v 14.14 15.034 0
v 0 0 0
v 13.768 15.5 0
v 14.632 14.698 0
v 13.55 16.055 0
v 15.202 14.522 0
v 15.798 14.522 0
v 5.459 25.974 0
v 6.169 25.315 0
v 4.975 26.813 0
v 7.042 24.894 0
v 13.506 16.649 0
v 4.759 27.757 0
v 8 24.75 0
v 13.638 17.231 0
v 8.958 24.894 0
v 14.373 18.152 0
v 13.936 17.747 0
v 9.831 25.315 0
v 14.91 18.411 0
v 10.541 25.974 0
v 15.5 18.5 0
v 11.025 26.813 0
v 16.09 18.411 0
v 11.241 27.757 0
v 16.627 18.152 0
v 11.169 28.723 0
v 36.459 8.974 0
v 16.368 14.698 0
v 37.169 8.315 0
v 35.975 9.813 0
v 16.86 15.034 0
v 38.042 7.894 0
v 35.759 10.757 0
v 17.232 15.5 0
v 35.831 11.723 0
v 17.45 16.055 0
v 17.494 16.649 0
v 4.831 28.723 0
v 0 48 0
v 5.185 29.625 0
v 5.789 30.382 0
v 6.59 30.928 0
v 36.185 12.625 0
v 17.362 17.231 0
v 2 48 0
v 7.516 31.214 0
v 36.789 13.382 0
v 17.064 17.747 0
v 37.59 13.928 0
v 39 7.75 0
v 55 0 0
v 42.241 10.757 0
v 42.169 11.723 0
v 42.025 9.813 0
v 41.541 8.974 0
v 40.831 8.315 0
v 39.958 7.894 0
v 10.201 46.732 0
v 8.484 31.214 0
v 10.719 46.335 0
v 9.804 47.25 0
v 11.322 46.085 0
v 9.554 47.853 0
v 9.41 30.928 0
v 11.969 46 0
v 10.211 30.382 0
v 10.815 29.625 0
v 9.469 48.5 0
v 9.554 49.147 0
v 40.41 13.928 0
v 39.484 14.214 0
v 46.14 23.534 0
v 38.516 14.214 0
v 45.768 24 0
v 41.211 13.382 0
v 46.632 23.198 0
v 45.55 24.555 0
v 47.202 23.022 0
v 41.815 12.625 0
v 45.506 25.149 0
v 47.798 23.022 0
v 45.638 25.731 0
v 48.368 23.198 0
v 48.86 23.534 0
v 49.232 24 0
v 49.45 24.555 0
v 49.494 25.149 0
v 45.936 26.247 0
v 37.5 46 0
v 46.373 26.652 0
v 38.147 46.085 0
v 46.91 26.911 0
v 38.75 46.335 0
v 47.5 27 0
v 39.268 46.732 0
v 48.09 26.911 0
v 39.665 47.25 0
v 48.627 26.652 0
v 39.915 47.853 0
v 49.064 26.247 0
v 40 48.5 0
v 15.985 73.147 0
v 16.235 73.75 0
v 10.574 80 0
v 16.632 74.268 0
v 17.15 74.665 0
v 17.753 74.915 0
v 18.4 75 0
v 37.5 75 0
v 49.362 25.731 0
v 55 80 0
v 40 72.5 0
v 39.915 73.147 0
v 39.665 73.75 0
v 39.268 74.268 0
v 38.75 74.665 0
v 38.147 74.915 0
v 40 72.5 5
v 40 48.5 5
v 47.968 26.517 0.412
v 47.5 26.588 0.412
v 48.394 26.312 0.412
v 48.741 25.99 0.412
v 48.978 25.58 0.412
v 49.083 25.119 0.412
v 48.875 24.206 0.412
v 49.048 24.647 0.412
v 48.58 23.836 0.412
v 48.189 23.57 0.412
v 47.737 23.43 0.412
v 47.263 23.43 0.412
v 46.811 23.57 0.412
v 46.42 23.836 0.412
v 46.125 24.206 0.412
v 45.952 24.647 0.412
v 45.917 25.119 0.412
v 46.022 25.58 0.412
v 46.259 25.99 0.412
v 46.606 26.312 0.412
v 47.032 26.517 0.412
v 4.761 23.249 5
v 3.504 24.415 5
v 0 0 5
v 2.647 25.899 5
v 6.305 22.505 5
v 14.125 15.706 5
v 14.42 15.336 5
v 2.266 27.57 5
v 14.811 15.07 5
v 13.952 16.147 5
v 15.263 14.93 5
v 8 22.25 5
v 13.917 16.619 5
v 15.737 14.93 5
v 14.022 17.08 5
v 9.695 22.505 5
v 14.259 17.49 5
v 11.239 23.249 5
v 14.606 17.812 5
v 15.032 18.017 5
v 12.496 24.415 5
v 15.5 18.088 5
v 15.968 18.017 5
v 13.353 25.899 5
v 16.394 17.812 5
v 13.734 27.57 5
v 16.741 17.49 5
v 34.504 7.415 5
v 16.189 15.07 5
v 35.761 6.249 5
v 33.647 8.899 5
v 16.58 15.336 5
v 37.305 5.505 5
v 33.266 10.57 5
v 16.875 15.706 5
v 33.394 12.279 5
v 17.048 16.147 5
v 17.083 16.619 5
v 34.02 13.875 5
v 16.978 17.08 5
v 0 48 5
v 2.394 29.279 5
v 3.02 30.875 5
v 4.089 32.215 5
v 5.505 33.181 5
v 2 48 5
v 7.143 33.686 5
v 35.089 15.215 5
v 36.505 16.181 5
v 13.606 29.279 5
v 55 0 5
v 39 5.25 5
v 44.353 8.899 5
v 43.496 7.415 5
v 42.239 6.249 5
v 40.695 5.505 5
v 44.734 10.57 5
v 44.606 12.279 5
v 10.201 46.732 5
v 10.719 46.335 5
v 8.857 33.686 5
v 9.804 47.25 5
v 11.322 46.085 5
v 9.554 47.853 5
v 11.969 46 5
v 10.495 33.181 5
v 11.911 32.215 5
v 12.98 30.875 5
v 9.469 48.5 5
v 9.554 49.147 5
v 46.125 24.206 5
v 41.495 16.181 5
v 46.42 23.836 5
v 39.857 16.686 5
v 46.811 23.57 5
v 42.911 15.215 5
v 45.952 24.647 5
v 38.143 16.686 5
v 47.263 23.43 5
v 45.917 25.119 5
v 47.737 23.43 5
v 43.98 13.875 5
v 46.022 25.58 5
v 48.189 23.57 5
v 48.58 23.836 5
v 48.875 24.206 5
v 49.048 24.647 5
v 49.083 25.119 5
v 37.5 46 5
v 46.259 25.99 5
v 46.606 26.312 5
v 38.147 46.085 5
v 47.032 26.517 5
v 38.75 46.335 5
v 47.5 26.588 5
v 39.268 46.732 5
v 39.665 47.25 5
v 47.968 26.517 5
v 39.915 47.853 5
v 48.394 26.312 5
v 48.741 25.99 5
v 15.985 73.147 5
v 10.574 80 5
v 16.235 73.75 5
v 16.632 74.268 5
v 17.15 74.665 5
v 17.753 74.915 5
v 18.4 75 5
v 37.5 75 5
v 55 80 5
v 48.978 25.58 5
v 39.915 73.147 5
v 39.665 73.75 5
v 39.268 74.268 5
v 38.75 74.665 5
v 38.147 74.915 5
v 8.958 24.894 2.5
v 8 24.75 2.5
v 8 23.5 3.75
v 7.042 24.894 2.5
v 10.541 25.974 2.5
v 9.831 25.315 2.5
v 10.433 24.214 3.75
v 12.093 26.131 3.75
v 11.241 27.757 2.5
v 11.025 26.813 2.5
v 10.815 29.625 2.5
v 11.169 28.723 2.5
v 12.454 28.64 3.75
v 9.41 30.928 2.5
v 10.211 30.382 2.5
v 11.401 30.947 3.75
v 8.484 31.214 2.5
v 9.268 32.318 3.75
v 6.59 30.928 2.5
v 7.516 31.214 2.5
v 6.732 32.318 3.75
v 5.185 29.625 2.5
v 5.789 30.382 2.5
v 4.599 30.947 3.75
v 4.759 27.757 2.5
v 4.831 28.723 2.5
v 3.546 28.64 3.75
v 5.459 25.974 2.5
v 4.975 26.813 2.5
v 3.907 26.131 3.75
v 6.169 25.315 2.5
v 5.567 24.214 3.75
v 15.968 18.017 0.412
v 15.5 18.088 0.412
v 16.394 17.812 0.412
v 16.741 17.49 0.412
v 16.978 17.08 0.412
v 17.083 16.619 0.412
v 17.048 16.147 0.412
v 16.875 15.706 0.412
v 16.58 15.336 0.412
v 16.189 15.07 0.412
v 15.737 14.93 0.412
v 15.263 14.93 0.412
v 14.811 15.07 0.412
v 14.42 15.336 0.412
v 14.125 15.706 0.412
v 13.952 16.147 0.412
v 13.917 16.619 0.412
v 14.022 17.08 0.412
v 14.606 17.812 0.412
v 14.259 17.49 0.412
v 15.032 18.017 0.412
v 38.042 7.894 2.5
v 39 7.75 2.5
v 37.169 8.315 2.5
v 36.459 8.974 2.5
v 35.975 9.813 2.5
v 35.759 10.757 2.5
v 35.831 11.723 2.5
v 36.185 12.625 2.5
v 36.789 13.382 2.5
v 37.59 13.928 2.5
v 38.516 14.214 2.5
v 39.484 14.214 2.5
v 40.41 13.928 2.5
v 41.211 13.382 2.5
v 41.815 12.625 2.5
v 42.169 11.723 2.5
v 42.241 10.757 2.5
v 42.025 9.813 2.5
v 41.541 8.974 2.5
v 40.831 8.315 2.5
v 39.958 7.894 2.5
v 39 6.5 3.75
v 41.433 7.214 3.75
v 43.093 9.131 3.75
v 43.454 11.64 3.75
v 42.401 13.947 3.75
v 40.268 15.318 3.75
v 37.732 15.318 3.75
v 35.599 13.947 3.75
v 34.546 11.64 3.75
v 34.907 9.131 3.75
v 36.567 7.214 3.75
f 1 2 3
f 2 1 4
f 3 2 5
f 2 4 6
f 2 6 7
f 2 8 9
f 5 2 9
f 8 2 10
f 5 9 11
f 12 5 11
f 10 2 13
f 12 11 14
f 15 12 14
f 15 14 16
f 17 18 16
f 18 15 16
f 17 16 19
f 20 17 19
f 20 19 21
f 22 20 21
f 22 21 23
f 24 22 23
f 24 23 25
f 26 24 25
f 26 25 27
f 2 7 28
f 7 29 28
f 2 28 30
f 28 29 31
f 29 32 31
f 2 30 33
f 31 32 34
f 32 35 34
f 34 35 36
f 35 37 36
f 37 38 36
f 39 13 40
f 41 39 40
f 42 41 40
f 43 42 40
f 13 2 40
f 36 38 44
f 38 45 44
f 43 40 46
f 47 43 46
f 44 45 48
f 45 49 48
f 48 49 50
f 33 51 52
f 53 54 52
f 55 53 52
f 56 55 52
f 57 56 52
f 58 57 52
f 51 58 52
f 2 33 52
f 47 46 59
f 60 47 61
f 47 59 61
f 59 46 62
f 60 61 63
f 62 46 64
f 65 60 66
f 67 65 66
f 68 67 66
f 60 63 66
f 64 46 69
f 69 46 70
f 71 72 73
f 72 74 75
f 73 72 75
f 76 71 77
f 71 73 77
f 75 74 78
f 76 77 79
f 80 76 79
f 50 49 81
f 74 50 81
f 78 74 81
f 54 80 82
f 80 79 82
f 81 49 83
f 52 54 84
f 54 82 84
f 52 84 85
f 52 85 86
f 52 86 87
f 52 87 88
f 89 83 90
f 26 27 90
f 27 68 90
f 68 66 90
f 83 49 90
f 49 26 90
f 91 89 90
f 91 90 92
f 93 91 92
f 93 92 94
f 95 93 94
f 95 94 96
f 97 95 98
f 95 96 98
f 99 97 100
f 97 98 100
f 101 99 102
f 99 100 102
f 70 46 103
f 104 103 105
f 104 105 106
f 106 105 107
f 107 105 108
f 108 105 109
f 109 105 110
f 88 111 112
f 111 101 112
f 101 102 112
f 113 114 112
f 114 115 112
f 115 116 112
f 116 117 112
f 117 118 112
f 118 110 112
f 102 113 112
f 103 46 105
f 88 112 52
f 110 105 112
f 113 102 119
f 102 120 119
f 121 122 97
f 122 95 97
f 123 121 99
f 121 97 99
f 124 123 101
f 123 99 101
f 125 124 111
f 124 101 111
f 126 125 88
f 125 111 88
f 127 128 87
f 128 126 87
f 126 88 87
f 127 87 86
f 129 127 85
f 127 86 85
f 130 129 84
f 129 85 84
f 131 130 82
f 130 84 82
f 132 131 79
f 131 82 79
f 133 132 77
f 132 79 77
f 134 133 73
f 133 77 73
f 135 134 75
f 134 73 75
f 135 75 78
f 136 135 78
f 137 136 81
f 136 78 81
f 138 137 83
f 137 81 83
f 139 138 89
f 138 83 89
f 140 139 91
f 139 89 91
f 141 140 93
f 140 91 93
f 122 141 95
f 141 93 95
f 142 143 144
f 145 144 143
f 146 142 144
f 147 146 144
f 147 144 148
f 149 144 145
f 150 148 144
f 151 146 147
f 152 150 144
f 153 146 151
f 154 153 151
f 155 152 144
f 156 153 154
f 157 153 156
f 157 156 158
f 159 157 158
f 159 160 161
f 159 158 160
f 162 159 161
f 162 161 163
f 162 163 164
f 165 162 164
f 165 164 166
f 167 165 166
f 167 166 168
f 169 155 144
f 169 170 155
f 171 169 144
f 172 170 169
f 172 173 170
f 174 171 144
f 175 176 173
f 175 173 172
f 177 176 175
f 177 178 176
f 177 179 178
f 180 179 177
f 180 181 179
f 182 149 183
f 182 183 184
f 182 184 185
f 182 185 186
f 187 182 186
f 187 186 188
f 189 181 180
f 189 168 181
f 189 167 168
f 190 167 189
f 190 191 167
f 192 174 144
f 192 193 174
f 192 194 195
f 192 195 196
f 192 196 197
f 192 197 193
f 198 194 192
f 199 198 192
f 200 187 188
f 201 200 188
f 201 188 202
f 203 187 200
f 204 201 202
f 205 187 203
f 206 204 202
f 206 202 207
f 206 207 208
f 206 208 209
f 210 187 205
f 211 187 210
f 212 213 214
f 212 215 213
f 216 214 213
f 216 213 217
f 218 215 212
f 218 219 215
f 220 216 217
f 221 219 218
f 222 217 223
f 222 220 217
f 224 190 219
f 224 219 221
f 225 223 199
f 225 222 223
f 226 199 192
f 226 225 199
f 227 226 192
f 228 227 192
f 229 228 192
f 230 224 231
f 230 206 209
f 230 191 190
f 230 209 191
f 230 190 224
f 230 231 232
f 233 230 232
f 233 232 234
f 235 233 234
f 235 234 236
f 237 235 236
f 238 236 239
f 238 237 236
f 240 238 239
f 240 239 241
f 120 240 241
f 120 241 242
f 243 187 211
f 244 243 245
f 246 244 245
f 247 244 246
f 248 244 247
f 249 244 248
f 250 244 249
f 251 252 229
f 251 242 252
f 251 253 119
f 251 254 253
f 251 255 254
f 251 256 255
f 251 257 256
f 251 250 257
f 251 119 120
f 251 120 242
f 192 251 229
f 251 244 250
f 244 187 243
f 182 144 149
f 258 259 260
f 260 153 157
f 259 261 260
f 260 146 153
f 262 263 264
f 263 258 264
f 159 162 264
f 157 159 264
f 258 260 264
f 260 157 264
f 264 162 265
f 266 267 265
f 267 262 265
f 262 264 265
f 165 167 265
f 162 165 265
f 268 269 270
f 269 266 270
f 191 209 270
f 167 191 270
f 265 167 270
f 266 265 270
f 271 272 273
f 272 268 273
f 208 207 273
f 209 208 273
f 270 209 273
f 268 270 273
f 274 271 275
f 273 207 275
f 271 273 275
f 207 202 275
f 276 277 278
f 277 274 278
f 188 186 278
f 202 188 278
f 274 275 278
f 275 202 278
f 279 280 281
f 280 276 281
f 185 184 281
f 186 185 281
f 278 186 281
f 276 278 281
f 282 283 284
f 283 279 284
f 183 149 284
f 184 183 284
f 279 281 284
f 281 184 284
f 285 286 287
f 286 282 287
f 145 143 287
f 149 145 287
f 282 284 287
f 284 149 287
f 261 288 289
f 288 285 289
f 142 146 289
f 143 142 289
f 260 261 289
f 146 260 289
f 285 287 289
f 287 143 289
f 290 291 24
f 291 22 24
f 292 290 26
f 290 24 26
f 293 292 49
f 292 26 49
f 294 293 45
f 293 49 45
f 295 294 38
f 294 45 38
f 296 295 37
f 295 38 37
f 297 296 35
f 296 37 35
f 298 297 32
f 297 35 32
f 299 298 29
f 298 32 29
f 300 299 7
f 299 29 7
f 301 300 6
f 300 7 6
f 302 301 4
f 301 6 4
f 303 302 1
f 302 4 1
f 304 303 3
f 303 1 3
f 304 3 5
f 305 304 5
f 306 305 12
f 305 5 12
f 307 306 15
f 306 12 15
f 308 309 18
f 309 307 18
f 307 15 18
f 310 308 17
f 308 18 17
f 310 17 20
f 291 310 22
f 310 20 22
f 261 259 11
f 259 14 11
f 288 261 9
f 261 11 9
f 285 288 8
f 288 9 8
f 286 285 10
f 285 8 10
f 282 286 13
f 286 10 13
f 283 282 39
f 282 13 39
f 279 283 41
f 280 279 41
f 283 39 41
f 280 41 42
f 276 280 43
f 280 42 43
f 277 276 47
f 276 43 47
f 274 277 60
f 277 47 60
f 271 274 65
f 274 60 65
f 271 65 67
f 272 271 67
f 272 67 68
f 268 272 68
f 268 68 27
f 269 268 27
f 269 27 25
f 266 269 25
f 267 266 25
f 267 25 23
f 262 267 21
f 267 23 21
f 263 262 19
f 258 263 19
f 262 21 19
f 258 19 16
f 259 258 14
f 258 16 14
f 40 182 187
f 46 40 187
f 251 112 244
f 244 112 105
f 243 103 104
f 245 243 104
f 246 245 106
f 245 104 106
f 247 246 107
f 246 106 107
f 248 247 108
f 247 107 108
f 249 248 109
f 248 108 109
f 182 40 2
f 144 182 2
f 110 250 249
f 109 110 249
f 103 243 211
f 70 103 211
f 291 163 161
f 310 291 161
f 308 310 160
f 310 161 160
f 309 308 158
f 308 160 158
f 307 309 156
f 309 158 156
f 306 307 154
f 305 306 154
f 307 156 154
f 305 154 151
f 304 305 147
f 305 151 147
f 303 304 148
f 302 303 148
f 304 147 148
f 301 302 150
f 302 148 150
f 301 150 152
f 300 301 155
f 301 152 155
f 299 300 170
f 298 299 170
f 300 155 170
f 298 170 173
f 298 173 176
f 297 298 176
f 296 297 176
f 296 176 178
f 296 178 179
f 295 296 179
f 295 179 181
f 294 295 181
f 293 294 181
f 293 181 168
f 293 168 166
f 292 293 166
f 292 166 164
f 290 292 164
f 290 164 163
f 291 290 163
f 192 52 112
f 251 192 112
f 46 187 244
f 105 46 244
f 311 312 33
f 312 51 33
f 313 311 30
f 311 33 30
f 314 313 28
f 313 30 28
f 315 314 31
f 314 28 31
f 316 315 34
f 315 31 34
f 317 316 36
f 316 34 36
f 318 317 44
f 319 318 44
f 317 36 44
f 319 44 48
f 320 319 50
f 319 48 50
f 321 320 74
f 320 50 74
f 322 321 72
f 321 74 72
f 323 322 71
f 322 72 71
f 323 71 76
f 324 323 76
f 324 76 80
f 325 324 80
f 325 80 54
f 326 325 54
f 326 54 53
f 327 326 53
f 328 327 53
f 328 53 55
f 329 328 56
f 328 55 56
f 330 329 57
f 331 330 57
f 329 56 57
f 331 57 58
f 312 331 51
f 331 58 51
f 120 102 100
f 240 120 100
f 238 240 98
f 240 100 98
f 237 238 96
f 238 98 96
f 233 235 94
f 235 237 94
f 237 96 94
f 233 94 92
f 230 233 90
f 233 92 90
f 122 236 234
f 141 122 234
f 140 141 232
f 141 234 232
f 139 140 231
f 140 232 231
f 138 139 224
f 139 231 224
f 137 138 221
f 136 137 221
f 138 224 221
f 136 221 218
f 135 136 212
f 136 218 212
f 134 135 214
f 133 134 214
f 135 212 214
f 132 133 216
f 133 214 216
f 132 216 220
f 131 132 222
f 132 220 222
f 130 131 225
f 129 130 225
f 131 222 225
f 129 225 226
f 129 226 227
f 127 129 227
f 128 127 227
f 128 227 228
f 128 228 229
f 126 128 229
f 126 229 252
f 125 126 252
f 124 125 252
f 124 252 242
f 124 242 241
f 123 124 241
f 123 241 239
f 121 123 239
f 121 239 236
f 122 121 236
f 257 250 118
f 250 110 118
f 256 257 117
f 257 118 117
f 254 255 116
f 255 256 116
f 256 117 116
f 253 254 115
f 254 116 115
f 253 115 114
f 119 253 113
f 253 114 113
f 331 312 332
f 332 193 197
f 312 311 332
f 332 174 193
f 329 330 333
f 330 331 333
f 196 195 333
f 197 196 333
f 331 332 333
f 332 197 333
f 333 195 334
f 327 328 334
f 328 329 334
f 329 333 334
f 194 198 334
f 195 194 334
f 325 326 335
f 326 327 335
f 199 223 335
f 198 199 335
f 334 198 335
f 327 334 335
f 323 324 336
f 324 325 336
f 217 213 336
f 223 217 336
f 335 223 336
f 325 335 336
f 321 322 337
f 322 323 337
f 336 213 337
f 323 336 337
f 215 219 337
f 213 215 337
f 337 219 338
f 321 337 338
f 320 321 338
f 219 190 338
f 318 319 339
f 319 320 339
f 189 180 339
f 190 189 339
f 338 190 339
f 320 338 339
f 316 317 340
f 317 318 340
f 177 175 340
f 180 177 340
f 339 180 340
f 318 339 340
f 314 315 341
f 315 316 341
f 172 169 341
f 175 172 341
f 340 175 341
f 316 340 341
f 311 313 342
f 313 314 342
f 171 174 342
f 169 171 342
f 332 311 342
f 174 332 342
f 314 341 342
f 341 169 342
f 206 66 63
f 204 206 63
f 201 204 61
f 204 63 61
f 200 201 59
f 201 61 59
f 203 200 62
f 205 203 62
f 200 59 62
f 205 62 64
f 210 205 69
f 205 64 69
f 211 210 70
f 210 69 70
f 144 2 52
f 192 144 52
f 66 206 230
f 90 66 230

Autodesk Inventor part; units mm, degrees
ref_plane "YZ Plane" through (0, 0, 0) normal (1, 0, 0) x (0, 1, 0)
ref_plane "XZ Plane" through (0, 0, 0) normal (0, 1, 0) x (-1, 0, 0)
ref_plane "XY Plane" through (0, 0, 0) normal (0, 0, 1) x (1, 0, 0)
sketch "Sketch1" plane through (0, 0, 0) normal (0, 0, 1) x (1, 0, 0)
  line L0 (0, 0) -> (55, 0)
  line L1 (55, 0) -> (55, 80)
  line L2 (55, 80) -> (0, 80)
  line L3 (0, 80) -> (0, 0)
  dimension "d0" = 55
  dimension "d1" = 80
extrude "Extrusion1" add sketch "Sketch1" along normal blind 5
sketch "Sketch6" plane through (0, 0, 5) normal (0, 0, 1) x (1, 0, 0)
  line L0 (0, 0) -> (0, 80) projected
  line L1 (55, 0) -> (0, 0) projected
  line L2 (0, 80) -> (55, 80) projected
  line L3 (0, 48) -> (2, 48)
  line L4 (2, 48) -> (10.5744, 80)
  dimension "d37" = 15
  dimension "d38" = 2
  dimension "d39" = 48
extrude "Extrusion4" cut sketch "Sketch6" against normal blind 5
sketch "Sketch7" plane through (0, 0, 5) normal (0, 0, 1) x (1, 0, 0)
  line L0 (10.5744, 80) -> (2, 48) projected
  line L1 (55, 80) -> (55, 0) projected
  line L2 (10.5744, 80) -> (55, 80) projected
  line L3 (40, 46) -> (40, 75)
  line L4 (40, 75) -> (16.4816, 75)
  line L5 (16.4816, 75) -> (8.711, 46)
  line L6 (8.711, 46) -> (40, 46)
  dimension "d42" = 29
  dimension "d43" = 5
  dimension "d44" = 15
  dimension "d45" = 7
extrude "Extrusion5" cut sketch "Sketch7" against normal blind 5
fillet "Fillet2" radius 2.5 4 edges at (16.4816, 75, 2.5) (40, 75, 2.5) (8.711, 46, 2.5) (40, 46, 2.5)
sketch "Sketch8" plane through (0, 0, 5) normal (0, 0, 1) x (1, 0, 0)
  line L0 (0, 0) -> (0, 48) projected
  line L1 (55, 0) -> (0, 0) projected
  line L2 (55, 80) -> (55, 0) projected
  point P0 (8, 28)
  point P1 (39, 11)
  dimension "d49" = 8
  dimension "d50" = 16
  dimension "d51" = 28
  dimension "d52" = 11
hole "Hole3" at (8, 28, 5) at (39, 11, 5) direction (0, 0, -1) diameter 6.5 depth 5 tip angle 118 countersink diameter 11.5 countersink angle 90
sketch "Sketch9" plane through (0, 0, 0) normal (0, 0, -1) x (-1, 0, 0)
  line L0 (-55, 0) -> (-55, 80) projected
  line L1 (0, 0) -> (-55, 0) projected
  line L2 (0, 48) -> (0, 0) projected
  point P0 (-15.5, 16.5)
  point P1 (-47.5, 25)
  dimension "d60" = 16.5
  dimension "d61" = 15.5
  dimension "d62" = 25
  dimension "d63" = 7.5
hole "Hole4" at (15.5, 16.5, 0) at (47.5, 25, 0) direction (0, 0, 1) diameter 3.175 depth 5 tip angle 118 countersink diameter 4 countersink angle 90
properties part number "LATERAL-ESQUERDA" material "Carbon Steel"
